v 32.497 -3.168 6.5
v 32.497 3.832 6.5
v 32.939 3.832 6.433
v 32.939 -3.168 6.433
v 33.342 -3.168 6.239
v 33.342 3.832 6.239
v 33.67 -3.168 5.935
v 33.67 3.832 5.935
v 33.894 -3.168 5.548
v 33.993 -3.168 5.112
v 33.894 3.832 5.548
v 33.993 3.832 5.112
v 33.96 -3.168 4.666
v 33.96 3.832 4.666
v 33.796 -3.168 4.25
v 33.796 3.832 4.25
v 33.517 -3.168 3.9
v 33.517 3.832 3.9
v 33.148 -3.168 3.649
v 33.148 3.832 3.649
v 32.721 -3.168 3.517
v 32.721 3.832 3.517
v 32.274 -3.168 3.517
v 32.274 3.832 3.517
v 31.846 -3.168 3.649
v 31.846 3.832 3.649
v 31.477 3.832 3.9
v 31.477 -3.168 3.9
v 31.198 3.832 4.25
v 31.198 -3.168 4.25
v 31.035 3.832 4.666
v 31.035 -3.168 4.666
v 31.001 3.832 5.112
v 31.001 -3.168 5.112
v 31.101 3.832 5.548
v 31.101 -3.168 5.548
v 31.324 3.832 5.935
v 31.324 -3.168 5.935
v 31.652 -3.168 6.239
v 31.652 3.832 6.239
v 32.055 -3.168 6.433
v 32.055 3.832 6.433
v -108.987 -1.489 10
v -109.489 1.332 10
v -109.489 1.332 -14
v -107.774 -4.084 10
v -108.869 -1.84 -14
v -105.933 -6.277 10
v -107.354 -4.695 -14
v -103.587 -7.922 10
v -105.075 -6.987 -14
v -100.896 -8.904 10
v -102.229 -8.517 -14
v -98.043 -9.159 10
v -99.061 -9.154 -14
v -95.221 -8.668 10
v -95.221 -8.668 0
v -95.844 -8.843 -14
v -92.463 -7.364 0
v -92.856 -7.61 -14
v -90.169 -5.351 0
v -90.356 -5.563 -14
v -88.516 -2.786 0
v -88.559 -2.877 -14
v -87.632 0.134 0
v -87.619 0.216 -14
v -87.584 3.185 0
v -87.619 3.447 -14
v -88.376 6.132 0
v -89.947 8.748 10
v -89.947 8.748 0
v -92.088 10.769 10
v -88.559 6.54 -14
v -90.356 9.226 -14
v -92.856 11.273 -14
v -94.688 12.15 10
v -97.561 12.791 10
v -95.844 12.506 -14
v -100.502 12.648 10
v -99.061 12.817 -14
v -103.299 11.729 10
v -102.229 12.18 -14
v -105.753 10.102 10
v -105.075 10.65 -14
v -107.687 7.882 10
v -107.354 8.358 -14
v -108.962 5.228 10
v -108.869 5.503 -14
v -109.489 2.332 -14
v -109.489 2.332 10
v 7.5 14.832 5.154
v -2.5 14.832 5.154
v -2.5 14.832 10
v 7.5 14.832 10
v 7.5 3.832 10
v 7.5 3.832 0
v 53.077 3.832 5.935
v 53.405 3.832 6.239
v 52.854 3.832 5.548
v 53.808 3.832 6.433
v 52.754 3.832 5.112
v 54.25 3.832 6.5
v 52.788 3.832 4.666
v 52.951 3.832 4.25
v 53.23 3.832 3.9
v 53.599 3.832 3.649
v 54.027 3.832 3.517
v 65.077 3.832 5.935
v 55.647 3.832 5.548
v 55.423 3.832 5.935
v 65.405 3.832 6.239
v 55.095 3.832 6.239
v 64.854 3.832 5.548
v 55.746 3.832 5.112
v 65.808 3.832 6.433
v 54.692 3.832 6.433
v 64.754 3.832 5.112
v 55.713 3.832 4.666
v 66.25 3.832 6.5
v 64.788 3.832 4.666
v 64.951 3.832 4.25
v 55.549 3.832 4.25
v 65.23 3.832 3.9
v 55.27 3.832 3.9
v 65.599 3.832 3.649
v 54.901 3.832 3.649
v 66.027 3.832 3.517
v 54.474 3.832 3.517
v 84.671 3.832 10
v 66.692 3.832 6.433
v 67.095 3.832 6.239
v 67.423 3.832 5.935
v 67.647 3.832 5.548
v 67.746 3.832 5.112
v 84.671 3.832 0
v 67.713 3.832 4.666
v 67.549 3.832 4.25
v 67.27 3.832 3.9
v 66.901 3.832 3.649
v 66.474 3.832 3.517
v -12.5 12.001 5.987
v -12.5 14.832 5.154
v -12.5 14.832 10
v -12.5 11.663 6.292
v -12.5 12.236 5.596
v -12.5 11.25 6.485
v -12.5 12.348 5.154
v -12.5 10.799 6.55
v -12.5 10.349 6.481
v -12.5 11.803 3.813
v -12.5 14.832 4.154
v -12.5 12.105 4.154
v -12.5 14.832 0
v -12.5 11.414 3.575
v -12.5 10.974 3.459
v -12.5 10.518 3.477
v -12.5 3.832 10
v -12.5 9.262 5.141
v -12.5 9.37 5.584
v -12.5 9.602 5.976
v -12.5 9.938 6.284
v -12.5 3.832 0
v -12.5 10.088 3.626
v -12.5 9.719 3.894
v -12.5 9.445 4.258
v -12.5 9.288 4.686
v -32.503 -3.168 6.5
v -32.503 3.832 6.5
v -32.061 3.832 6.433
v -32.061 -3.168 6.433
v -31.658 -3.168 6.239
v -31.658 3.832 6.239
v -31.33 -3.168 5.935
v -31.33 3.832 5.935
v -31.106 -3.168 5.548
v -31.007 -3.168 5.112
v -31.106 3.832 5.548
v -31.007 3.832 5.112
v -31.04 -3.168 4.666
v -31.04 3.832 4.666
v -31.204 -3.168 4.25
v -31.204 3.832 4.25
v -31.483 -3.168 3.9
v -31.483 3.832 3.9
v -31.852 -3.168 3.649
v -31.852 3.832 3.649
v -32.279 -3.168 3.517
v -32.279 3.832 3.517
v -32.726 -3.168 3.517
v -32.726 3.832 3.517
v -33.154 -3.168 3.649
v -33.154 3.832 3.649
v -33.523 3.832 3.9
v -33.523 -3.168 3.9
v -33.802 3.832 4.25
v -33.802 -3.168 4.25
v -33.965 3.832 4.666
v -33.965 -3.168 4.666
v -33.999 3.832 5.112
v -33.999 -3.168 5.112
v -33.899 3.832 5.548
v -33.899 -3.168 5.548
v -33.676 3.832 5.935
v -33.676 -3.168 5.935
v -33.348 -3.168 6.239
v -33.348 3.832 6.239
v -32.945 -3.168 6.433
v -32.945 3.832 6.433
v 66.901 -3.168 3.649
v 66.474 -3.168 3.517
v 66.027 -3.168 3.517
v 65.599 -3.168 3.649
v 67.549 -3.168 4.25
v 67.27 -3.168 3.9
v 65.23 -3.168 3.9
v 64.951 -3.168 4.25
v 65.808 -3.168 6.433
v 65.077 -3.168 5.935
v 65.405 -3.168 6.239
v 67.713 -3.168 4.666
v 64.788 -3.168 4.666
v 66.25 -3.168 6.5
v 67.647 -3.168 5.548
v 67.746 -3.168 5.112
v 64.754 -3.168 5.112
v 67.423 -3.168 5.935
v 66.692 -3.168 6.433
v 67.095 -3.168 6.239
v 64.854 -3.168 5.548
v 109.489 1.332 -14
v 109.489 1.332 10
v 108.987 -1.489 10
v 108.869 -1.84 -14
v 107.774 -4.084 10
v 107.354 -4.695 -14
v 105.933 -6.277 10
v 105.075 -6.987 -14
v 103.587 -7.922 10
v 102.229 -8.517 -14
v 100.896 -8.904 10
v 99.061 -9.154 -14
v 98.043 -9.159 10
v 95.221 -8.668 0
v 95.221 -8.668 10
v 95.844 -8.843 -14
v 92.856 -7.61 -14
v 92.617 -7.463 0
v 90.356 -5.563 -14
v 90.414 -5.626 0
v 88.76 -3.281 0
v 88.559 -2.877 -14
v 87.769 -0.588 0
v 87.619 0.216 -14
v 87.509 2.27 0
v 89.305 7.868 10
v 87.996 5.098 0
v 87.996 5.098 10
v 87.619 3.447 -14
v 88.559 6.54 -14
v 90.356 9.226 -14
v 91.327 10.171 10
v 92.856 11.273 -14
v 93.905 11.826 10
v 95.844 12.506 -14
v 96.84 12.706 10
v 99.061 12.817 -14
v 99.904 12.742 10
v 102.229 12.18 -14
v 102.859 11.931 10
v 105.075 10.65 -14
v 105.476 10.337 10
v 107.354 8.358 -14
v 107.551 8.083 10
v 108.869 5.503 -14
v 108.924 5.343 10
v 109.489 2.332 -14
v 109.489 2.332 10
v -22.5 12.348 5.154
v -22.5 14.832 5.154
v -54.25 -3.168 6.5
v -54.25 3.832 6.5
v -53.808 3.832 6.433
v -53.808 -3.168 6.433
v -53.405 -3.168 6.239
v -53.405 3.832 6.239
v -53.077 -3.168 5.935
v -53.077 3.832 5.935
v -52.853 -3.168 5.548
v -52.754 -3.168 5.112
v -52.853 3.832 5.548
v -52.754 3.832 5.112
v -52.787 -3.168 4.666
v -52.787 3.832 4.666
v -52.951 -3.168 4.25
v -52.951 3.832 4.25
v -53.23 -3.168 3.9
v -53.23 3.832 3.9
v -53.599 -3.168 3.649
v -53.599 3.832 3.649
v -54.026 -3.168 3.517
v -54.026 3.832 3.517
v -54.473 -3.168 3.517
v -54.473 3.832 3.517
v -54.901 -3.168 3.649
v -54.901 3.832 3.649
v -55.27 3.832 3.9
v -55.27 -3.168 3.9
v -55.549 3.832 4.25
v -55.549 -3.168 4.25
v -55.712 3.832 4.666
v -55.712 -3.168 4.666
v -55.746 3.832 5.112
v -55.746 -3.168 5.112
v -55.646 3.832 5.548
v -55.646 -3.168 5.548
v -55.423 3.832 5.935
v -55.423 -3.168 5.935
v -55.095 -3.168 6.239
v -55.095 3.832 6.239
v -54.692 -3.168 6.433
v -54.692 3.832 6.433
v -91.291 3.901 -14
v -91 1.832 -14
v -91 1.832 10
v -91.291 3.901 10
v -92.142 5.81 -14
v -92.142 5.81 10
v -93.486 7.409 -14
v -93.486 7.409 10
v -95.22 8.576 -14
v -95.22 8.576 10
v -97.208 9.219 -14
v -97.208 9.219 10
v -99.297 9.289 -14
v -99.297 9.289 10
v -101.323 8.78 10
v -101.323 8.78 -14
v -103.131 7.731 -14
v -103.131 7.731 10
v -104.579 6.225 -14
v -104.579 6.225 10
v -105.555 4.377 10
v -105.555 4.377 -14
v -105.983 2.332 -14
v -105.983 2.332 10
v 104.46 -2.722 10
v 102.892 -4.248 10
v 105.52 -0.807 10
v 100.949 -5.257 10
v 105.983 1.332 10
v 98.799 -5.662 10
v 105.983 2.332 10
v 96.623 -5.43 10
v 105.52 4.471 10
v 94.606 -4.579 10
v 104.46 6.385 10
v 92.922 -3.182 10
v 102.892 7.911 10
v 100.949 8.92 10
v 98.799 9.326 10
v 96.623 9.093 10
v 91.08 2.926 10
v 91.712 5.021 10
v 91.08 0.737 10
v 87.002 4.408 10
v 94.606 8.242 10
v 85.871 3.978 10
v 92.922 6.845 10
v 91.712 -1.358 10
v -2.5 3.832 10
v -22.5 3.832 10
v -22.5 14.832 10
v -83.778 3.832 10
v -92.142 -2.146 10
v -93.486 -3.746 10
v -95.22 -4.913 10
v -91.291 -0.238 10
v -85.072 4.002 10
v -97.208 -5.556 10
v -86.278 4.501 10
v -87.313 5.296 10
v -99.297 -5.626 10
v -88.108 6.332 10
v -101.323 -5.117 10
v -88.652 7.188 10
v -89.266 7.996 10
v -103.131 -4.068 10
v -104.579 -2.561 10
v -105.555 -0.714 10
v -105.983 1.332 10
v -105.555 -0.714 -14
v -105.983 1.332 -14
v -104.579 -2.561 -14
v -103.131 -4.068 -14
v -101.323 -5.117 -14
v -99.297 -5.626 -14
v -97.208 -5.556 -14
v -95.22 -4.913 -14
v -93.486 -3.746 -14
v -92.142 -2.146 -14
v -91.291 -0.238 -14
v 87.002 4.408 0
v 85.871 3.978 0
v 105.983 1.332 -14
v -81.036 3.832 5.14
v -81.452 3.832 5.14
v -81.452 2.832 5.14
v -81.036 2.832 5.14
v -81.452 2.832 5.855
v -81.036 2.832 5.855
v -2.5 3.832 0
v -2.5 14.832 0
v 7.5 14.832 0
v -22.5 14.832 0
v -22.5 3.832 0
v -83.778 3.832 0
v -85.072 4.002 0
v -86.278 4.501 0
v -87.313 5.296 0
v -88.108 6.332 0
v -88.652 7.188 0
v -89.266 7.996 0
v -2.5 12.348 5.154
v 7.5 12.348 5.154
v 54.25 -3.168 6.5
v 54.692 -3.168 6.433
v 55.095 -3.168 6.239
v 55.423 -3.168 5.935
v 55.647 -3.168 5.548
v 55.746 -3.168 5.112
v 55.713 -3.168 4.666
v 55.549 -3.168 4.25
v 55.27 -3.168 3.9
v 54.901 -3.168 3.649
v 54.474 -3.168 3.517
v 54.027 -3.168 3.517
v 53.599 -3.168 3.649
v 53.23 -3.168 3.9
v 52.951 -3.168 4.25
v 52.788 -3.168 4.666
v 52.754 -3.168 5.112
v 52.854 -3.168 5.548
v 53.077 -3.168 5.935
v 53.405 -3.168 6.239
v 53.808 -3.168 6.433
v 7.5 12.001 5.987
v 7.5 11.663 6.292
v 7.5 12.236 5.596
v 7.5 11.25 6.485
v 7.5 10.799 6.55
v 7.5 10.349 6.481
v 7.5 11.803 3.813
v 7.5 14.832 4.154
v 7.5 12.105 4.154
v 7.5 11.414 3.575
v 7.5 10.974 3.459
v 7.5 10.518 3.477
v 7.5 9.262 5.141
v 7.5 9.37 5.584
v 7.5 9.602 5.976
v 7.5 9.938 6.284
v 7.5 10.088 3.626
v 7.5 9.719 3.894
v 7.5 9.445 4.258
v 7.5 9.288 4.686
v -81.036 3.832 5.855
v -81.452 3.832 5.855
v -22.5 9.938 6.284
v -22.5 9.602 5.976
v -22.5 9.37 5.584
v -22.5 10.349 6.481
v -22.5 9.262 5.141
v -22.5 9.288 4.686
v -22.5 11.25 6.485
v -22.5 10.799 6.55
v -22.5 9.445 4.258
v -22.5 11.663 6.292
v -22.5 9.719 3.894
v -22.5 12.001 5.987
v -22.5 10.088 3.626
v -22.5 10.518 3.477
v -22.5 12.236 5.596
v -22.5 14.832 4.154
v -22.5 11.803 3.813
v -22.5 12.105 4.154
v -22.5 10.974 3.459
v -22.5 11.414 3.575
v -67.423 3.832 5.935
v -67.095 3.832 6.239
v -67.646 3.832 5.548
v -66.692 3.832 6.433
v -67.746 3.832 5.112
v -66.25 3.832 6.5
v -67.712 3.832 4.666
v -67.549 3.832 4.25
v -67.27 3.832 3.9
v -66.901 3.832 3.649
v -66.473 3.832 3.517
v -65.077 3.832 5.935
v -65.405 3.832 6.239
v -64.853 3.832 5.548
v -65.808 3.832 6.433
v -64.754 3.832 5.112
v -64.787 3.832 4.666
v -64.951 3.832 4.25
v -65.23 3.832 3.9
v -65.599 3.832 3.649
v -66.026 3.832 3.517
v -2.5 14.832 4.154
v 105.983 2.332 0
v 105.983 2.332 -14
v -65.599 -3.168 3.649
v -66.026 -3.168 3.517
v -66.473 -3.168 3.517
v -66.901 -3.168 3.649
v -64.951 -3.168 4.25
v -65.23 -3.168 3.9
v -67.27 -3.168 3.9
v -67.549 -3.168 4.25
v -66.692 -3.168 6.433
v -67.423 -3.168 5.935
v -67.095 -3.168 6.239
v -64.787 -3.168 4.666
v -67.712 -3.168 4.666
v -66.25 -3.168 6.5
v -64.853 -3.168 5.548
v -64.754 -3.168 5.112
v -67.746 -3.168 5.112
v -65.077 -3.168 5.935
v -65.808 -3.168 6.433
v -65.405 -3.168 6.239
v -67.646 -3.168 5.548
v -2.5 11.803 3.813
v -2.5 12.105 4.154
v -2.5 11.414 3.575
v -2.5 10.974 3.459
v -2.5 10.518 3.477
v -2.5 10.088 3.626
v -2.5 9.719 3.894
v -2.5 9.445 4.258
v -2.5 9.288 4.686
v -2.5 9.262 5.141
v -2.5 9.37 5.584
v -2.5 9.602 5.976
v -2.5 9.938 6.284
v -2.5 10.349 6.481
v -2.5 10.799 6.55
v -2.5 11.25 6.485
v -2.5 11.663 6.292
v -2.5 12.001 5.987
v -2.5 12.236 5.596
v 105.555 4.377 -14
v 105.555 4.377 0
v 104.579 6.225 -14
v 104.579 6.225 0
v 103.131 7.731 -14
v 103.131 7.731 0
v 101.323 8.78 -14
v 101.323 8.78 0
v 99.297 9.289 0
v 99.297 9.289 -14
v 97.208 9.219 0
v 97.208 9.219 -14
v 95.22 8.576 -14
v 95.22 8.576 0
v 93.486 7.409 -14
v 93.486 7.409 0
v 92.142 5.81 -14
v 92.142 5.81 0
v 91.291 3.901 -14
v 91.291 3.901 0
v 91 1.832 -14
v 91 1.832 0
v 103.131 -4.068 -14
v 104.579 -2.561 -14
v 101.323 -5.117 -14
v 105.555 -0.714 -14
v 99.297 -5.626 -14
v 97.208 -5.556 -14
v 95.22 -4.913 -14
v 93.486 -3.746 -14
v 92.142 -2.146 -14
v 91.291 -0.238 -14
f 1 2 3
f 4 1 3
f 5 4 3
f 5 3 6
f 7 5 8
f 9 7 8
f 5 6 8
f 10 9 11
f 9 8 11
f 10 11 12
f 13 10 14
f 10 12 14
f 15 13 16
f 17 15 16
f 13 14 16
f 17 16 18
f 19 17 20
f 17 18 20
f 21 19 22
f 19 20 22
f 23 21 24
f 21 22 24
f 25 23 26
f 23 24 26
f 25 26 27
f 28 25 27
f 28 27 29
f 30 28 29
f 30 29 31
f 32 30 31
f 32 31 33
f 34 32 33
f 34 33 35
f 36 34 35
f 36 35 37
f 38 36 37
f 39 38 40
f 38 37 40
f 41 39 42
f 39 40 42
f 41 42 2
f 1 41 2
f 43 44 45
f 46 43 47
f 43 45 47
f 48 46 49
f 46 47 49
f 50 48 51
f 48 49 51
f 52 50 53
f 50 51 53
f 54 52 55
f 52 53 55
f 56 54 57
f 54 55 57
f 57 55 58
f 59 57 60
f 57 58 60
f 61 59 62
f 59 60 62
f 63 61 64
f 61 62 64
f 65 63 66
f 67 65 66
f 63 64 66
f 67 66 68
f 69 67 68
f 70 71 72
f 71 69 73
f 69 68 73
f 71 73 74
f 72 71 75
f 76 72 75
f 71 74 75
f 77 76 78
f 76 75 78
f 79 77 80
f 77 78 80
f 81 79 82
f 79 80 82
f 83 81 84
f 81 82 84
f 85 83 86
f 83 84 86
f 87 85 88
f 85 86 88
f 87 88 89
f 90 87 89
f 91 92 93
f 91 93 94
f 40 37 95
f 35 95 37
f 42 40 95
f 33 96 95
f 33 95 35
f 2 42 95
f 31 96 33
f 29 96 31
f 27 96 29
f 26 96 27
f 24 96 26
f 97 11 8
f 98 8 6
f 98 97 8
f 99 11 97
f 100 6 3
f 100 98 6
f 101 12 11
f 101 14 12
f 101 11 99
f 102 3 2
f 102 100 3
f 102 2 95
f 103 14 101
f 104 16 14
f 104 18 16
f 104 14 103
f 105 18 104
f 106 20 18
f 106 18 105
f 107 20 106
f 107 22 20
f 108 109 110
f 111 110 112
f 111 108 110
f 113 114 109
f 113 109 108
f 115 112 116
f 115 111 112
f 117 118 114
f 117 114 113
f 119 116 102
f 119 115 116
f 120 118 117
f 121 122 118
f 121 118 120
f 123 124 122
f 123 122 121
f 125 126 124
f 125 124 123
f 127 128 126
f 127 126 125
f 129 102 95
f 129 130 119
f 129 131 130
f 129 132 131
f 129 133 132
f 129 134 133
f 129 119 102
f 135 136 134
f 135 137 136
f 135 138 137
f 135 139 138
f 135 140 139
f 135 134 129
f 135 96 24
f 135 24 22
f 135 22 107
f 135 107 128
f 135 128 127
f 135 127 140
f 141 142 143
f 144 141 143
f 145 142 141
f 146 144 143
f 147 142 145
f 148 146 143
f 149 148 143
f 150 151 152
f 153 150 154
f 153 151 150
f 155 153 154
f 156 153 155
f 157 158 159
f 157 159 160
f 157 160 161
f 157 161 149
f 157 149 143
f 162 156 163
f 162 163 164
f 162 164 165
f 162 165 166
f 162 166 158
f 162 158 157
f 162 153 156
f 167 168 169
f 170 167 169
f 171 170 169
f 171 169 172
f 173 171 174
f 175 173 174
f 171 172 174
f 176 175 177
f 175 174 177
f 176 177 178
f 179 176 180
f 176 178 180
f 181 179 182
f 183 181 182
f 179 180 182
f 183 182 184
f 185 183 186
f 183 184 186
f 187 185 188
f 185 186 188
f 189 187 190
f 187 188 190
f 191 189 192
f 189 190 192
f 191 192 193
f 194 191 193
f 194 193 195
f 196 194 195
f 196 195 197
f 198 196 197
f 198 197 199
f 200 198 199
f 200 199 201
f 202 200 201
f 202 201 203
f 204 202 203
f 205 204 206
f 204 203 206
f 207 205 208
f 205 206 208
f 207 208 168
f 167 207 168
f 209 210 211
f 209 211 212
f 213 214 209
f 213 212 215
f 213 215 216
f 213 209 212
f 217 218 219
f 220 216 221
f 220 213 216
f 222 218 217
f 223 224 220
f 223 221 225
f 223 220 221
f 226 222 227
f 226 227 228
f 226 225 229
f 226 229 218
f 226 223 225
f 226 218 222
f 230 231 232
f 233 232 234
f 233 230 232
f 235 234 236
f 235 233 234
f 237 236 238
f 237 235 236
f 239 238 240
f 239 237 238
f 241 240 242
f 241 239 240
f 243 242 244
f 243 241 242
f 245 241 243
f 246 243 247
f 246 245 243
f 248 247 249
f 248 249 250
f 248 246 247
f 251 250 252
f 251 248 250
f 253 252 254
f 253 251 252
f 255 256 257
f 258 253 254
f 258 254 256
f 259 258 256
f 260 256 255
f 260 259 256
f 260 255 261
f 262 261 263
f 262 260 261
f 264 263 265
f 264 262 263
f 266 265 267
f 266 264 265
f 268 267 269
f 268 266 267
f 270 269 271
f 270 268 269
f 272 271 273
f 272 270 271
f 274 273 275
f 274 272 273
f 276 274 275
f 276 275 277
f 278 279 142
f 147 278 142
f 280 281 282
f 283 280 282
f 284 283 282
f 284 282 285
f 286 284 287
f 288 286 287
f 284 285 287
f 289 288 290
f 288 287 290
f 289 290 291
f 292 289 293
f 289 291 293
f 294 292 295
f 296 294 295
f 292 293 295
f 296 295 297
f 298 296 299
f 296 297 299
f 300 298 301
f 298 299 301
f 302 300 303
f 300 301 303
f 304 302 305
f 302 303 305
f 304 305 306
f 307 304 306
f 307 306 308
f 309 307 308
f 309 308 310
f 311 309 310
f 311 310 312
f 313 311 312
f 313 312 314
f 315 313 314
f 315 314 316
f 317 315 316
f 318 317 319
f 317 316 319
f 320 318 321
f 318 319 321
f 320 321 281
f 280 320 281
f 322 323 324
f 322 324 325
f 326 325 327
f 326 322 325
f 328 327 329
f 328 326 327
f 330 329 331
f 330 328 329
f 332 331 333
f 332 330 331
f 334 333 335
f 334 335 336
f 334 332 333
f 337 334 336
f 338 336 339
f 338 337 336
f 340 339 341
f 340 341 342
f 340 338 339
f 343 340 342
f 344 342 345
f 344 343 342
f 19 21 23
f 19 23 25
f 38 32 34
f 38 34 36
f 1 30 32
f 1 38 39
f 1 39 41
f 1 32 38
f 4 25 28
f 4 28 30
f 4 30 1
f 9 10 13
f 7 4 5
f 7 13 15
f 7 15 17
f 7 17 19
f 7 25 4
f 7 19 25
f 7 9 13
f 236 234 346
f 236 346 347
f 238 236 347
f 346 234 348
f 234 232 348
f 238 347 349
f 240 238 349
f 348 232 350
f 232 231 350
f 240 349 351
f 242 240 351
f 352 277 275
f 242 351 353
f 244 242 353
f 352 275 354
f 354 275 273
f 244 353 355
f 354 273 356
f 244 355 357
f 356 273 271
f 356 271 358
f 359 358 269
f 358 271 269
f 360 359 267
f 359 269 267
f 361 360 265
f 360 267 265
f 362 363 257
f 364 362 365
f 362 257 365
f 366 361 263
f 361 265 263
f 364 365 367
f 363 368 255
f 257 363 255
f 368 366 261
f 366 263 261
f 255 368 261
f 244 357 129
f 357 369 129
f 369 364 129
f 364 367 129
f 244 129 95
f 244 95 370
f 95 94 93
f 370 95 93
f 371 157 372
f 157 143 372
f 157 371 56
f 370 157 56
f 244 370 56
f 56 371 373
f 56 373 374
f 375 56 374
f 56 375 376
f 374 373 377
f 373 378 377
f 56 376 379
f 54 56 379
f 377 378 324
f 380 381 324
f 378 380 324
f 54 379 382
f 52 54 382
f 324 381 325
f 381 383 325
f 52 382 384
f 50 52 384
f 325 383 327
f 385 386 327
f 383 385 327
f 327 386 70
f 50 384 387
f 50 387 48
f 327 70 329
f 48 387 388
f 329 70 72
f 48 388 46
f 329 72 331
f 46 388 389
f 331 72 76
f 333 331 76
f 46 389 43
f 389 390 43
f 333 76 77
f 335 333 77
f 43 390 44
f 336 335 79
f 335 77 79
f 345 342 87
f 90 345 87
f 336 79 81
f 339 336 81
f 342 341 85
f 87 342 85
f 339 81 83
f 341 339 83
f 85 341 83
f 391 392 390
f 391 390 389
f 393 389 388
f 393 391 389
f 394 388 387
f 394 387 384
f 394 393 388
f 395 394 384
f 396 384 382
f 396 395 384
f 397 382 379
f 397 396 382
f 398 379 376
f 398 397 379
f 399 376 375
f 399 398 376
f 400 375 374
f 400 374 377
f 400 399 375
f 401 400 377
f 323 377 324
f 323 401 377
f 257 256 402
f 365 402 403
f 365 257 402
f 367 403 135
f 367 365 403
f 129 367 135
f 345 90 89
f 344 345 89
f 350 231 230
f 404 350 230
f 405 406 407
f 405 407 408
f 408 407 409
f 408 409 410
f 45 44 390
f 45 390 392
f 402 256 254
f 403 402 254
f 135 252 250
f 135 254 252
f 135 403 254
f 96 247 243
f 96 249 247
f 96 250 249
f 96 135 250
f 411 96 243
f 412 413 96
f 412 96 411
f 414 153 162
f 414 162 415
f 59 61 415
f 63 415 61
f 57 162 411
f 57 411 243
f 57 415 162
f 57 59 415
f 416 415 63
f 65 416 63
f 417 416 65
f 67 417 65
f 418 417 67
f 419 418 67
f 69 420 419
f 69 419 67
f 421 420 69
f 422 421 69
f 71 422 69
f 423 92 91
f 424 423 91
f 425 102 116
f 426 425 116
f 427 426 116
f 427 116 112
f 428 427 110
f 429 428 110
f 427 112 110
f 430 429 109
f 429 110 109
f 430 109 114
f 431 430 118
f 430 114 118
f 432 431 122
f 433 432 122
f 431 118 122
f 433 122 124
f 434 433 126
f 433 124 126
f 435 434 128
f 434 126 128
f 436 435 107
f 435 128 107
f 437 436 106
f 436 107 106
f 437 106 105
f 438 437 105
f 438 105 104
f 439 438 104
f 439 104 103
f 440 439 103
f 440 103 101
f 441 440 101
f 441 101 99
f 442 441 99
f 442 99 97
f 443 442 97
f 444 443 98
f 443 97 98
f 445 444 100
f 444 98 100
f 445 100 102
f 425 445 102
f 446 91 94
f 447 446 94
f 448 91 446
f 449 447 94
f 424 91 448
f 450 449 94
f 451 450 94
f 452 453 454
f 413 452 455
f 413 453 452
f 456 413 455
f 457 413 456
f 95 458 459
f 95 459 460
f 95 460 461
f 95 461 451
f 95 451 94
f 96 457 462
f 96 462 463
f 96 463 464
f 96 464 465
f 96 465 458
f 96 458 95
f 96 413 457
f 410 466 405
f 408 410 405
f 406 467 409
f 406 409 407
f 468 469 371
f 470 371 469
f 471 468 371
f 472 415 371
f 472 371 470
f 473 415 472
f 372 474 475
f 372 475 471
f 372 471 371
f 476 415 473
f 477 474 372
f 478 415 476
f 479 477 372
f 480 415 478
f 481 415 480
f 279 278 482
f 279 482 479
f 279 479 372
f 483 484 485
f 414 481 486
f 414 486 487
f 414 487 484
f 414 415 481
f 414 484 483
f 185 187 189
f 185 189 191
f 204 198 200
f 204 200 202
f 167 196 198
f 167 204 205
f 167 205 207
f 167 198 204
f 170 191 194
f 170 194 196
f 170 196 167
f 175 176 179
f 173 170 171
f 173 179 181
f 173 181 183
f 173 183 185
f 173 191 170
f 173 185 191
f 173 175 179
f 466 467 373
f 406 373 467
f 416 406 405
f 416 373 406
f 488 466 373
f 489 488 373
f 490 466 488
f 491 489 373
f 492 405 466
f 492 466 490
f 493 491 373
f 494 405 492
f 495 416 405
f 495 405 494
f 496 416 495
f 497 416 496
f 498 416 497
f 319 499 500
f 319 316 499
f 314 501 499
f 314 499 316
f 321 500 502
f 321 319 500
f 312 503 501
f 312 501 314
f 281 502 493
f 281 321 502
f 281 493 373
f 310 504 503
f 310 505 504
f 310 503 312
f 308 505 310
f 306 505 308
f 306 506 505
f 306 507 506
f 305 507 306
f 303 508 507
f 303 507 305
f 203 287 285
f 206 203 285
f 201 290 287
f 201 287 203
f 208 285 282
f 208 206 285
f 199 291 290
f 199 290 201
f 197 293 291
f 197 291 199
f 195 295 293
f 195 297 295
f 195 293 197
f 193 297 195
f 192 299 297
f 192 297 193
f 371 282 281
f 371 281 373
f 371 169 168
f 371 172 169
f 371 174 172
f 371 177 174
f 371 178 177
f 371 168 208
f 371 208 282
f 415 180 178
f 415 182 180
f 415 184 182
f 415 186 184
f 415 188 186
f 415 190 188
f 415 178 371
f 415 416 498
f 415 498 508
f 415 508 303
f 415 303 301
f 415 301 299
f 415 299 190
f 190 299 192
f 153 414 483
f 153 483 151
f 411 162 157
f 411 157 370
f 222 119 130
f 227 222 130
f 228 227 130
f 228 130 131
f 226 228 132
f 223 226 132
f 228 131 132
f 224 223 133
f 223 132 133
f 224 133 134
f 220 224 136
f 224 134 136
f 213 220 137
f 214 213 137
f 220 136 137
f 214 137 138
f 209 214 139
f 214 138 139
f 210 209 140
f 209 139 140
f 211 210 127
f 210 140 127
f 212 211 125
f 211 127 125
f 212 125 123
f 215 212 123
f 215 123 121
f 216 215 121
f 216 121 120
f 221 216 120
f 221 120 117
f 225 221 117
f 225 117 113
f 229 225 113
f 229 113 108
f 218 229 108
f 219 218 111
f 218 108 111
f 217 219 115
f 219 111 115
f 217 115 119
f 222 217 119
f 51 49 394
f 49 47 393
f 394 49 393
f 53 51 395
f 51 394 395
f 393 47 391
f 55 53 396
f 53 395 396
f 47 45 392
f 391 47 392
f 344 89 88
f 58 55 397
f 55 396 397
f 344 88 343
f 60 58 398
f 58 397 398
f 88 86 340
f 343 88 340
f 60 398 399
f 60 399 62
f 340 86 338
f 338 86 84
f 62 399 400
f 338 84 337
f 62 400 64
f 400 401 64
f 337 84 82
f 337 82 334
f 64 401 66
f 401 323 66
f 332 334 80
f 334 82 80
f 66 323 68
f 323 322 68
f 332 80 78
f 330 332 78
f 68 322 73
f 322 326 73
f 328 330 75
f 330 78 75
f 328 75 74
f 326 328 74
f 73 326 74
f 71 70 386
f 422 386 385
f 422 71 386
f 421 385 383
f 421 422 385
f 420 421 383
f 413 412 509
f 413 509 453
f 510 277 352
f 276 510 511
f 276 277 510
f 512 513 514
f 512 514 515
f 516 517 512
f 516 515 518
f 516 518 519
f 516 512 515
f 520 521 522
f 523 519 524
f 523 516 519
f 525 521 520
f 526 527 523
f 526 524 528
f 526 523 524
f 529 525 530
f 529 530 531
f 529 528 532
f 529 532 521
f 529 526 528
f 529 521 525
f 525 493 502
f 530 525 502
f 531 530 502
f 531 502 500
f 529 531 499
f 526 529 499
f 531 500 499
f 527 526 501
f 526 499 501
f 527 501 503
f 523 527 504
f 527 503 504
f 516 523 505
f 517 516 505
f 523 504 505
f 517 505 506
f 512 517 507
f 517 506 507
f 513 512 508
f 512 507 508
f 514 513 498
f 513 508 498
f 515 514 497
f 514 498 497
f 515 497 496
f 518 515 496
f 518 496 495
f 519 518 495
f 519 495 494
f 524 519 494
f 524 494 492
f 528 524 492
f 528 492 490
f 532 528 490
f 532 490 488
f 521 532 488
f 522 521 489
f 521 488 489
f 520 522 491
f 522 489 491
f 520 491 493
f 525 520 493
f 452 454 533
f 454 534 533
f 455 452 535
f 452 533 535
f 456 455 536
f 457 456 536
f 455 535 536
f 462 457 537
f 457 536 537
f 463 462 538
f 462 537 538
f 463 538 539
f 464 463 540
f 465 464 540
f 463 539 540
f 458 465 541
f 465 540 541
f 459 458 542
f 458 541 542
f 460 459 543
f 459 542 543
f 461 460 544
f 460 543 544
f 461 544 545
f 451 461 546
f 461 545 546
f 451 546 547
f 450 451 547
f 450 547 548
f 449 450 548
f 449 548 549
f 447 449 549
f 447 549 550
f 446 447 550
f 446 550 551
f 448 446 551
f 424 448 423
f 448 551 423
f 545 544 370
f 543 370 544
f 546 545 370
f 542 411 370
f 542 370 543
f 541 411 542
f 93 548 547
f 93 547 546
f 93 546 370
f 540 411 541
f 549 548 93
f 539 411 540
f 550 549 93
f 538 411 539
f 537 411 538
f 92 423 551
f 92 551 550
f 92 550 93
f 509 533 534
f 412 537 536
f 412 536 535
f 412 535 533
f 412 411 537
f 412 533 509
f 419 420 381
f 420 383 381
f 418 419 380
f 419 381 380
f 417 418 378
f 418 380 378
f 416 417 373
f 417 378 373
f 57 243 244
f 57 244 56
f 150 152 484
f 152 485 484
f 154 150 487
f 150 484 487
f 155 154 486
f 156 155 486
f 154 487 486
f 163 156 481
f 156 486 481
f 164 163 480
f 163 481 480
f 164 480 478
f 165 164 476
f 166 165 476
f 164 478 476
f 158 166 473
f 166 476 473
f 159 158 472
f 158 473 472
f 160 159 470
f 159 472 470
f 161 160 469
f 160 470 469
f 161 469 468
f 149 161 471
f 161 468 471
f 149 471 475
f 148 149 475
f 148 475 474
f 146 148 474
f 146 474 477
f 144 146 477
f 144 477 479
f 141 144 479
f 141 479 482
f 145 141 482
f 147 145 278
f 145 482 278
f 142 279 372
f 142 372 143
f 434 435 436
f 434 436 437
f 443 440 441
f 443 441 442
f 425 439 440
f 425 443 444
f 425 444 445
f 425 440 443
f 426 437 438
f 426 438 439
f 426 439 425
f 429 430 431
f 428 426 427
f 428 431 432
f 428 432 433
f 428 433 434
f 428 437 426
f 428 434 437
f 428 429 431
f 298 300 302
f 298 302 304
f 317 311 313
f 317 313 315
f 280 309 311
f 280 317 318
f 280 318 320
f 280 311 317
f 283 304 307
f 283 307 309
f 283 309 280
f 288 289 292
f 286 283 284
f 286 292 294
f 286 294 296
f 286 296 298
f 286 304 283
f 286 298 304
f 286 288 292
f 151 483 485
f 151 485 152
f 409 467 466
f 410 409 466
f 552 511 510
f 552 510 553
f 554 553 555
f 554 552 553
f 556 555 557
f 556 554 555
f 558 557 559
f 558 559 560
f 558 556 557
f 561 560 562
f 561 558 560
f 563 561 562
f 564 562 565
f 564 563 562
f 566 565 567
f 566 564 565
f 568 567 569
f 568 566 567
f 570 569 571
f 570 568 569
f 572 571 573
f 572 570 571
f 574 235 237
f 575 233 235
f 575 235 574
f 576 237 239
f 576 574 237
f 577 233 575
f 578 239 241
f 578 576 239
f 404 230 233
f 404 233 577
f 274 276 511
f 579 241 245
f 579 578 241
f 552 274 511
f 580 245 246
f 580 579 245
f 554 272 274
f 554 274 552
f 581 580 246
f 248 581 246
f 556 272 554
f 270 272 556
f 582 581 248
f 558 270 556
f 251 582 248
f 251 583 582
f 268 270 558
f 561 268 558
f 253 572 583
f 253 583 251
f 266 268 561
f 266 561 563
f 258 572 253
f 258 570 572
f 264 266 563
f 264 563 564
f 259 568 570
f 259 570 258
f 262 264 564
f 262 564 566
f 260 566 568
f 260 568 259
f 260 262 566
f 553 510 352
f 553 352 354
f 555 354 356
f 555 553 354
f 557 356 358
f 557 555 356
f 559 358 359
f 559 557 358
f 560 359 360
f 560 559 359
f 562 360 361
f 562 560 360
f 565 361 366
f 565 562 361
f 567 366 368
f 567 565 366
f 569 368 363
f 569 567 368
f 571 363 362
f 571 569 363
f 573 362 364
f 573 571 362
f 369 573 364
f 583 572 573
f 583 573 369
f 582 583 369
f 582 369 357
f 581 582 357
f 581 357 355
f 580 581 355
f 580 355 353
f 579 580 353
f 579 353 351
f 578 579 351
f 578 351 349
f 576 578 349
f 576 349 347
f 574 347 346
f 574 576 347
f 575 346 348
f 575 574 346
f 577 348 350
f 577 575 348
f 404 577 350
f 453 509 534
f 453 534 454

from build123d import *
from build123d.topology import SkipClean

# Parameters (mm, degrees)
SKETCH2_R           = 7.5
BOSS_EXTRUDE1_DEPTH = 10
FILLET1_R           = 5
BOSS_EXTRUDE2_START = -24
SKETCH3_R           = 11
SKETCH3_R_2         = 7.5
BOSS_EXTRUDE2_DEPTH = 24
CUT_EXTRUDE1_REACH  = 135.566
SKETCH4_R           = 1.55
SKETCH6_W           = 37.11251069
SKETCH6_H           = 1
CUT_EXTRUDE3_DEPTH  = 10
SKETCH7_W           = 36.737317401
SKETCH7_H           = 1
CUT_EXTRUDE4_DEPTH  = 3
FILLET2_R           = 5
SKETCH9_W           = 0.416349778
SKETCH9_H           = 0.714723325
CUT_EXTRUDE6_DEPTH  = 1
SKETCH8_R           = 1.5
CUT_EXTRUDE5_DEPTH  = 7


with BuildPart() as part:
    # Sketch2 → Boss-Extrude1 (new body)
    with BuildSketch(Plane.XY):
        with BuildLine():
            Line((-22.5, 3.831552556), (-22.5, 14.831552556))
            Line((-22.5, 14.831552556), (-12.5, 14.831552556))
            Line((-12.5, 14.831552556), (-12.5, 3.831552556))
            Line((-12.5, 3.831552556), (-2.5, 3.831552556))
            Line((-2.5, 3.831552556), (-2.5, 14.831552556))
            Line((-2.5, 14.831552556), (7.5, 14.831552556))
            Line((7.5, 14.831552556), (7.5, 3.831552556))
            Line((7.5, 3.831552556), (88.192235936, 3.831552556))
            ThreePointArc((88.192235936, 3.831552556), (91.819805392, 9.932478429), (98.5, 12.331552556))
            ThreePointArc((98.5, 12.331552556), (109, 1.831552556), (98.5, -8.668447444))
            Line((98.5, -8.668447444), (-98.5, -8.668447444))
            ThreePointArc((-98.5, -8.668447444), (-109, 1.831552556), (-98.5, 12.331552556))
            ThreePointArc((-98.5, 12.331552556), (-91.358571571, 9.975203317), (-87.021759717, 3.831552556))
            Line((-87.021759717, 3.831552556), (-22.5, 3.831552556))
        make_face()
        with Locations((-98.5, 1.831552556)):
            Circle(SKETCH2_R, mode=Mode.SUBTRACT)
        with Locations((98.5, 1.831552556)):
            Circle(SKETCH2_R, mode=Mode.SUBTRACT)
    extrude(amount=BOSS_EXTRUDE1_DEPTH)

    # Fillet1
    fillet1_edges = [part.edges().sort_by_distance(p)[0] for p in [
        (88.192235936, 3.831552556, 5),
    ]]
    fillet(fillet1_edges, radius=FILLET1_R)

    # Sketch3 → Boss-Extrude2 (add)
    with BuildSketch(Plane.XY.offset(10).offset(BOSS_EXTRUDE2_START)):
        with Locations((-98.5, 1.831552556)):
            Circle(SKETCH3_R)
        with Locations((-98.5, 1.831552556)):
            Circle(SKETCH3_R_2, mode=Mode.SUBTRACT)
    boss_extrude2 = extrude(amount=BOSS_EXTRUDE2_DEPTH)

    # Mirror1: Boss-Extrude2 across plane
    with SkipClean():  # the faces are left unmerged after this step: merging them gives an invalid solid
        add(boss_extrude2.mirror(Plane(origin=(0, 0, 0), x_dir=(0, 0, 1), z_dir=(1, 0, 0))))

    # Cut-Extrude1: up to this face of the body (flat: up to its plane)
    cut_extrude1_end = Plane(part.part.faces().sort_by_distance((7.5, 9.331552556, 5))[0])
    # Sketch4 → Cut-Extrude1 (cut, up to the picked face)
    with BuildSketch(Plane.ZY.offset(22.5), mode=Mode.PRIVATE) as cut_extrude1_sk1:
        with Locations((5, 10.805752832)):
            Circle(SKETCH4_R)
    cut_extrude1_tool1 = split(extrude(cut_extrude1_sk1.sketch, amount=-CUT_EXTRUDE1_REACH, mode=Mode.PRIVATE), bisect_by=cut_extrude1_end, keep=Keep.BOTH, mode=Mode.PRIVATE)
    add(cut_extrude1_tool1.solids().sort_by(Axis((-22.5, 10.805753, 5), (1, 0, 0)))[0], mode=Mode.SUBTRACT)

    # Sketch6 → Cut-Extrude3 (cut)
    with BuildSketch(Plane(origin=(110, 0, 0), x_dir=(0, 0, -1), z_dir=(1, 0, 0))):
        with Locations((1.381927251, 1.831552556)):
            Rectangle(SKETCH6_W, SKETCH6_H)
    cut_extrude3 = extrude(amount=-CUT_EXTRUDE3_DEPTH, mode=Mode.SUBTRACT)

    # Mirror2: Cut-Extrude3 across plane
    add(cut_extrude3.mirror(Plane(origin=(0, 0, 0), x_dir=(0, 0, 1), z_dir=(1, 0, 0))), mode=Mode.SUBTRACT)

    # Sketch7 → Cut-Extrude4 (cut)
    with BuildSketch(Plane(origin=(0, 14.831552556, 0), x_dir=(1, 0, 0), z_dir=(0, 1, 0))):
        with Locations((-7.879171978, -4.654369626)):
            Rectangle(SKETCH7_W, SKETCH7_H)
    extrude(amount=-CUT_EXTRUDE4_DEPTH, mode=Mode.SUBTRACT)

    # Fillet2
    fillet2_edges = [part.edges().sort_by_distance(p)[0] for p in [
        (-87.021759717, 3.831552556, 5),
    ]]
    fillet(fillet2_edges, radius=FILLET2_R)

    # Sketch9 → Cut-Extrude6 (cut)
    with BuildSketch(Plane(origin=(0, 3.831552556, 0), x_dir=(1, 0, 0), z_dir=(0, 1, 0))):
        with Locations((-81.24394575, -5.497333598)):
            Rectangle(SKETCH9_W, SKETCH9_H)
    extrude(amount=-CUT_EXTRUDE6_DEPTH, mode=Mode.SUBTRACT)

    # Sketch8 → Cut-Extrude5 (cut)
    with BuildSketch(Plane(origin=(0, 3.831552556, 0), x_dir=(1, 0, 0), z_dir=(0, 1, 0))):
        with Locations(Location((-66.24976189, -5, 0), (0, 0, 270))):
            Circle(SKETCH8_R)
        with Locations(Location((-54.24976189, -5, 0), (0, 0, 270))):
            Circle(SKETCH8_R)
        with Locations(Location((-32.502764064, -5, 0), (0, 0, 270))):
            Circle(SKETCH8_R)
        with Locations(Location((32.497235936, -5, 0), (0, 0, 270))):
            Circle(SKETCH8_R)
        with Locations(Location((54.25023811, -5, 0), (0, 0, 270))):
            Circle(SKETCH8_R)
        with Locations(Location((66.25023811, -5, 0), (0, 0, 270))):
            Circle(SKETCH8_R)
    extrude(amount=-CUT_EXTRUDE5_DEPTH, mode=Mode.SUBTRACT)


solid = part.part
